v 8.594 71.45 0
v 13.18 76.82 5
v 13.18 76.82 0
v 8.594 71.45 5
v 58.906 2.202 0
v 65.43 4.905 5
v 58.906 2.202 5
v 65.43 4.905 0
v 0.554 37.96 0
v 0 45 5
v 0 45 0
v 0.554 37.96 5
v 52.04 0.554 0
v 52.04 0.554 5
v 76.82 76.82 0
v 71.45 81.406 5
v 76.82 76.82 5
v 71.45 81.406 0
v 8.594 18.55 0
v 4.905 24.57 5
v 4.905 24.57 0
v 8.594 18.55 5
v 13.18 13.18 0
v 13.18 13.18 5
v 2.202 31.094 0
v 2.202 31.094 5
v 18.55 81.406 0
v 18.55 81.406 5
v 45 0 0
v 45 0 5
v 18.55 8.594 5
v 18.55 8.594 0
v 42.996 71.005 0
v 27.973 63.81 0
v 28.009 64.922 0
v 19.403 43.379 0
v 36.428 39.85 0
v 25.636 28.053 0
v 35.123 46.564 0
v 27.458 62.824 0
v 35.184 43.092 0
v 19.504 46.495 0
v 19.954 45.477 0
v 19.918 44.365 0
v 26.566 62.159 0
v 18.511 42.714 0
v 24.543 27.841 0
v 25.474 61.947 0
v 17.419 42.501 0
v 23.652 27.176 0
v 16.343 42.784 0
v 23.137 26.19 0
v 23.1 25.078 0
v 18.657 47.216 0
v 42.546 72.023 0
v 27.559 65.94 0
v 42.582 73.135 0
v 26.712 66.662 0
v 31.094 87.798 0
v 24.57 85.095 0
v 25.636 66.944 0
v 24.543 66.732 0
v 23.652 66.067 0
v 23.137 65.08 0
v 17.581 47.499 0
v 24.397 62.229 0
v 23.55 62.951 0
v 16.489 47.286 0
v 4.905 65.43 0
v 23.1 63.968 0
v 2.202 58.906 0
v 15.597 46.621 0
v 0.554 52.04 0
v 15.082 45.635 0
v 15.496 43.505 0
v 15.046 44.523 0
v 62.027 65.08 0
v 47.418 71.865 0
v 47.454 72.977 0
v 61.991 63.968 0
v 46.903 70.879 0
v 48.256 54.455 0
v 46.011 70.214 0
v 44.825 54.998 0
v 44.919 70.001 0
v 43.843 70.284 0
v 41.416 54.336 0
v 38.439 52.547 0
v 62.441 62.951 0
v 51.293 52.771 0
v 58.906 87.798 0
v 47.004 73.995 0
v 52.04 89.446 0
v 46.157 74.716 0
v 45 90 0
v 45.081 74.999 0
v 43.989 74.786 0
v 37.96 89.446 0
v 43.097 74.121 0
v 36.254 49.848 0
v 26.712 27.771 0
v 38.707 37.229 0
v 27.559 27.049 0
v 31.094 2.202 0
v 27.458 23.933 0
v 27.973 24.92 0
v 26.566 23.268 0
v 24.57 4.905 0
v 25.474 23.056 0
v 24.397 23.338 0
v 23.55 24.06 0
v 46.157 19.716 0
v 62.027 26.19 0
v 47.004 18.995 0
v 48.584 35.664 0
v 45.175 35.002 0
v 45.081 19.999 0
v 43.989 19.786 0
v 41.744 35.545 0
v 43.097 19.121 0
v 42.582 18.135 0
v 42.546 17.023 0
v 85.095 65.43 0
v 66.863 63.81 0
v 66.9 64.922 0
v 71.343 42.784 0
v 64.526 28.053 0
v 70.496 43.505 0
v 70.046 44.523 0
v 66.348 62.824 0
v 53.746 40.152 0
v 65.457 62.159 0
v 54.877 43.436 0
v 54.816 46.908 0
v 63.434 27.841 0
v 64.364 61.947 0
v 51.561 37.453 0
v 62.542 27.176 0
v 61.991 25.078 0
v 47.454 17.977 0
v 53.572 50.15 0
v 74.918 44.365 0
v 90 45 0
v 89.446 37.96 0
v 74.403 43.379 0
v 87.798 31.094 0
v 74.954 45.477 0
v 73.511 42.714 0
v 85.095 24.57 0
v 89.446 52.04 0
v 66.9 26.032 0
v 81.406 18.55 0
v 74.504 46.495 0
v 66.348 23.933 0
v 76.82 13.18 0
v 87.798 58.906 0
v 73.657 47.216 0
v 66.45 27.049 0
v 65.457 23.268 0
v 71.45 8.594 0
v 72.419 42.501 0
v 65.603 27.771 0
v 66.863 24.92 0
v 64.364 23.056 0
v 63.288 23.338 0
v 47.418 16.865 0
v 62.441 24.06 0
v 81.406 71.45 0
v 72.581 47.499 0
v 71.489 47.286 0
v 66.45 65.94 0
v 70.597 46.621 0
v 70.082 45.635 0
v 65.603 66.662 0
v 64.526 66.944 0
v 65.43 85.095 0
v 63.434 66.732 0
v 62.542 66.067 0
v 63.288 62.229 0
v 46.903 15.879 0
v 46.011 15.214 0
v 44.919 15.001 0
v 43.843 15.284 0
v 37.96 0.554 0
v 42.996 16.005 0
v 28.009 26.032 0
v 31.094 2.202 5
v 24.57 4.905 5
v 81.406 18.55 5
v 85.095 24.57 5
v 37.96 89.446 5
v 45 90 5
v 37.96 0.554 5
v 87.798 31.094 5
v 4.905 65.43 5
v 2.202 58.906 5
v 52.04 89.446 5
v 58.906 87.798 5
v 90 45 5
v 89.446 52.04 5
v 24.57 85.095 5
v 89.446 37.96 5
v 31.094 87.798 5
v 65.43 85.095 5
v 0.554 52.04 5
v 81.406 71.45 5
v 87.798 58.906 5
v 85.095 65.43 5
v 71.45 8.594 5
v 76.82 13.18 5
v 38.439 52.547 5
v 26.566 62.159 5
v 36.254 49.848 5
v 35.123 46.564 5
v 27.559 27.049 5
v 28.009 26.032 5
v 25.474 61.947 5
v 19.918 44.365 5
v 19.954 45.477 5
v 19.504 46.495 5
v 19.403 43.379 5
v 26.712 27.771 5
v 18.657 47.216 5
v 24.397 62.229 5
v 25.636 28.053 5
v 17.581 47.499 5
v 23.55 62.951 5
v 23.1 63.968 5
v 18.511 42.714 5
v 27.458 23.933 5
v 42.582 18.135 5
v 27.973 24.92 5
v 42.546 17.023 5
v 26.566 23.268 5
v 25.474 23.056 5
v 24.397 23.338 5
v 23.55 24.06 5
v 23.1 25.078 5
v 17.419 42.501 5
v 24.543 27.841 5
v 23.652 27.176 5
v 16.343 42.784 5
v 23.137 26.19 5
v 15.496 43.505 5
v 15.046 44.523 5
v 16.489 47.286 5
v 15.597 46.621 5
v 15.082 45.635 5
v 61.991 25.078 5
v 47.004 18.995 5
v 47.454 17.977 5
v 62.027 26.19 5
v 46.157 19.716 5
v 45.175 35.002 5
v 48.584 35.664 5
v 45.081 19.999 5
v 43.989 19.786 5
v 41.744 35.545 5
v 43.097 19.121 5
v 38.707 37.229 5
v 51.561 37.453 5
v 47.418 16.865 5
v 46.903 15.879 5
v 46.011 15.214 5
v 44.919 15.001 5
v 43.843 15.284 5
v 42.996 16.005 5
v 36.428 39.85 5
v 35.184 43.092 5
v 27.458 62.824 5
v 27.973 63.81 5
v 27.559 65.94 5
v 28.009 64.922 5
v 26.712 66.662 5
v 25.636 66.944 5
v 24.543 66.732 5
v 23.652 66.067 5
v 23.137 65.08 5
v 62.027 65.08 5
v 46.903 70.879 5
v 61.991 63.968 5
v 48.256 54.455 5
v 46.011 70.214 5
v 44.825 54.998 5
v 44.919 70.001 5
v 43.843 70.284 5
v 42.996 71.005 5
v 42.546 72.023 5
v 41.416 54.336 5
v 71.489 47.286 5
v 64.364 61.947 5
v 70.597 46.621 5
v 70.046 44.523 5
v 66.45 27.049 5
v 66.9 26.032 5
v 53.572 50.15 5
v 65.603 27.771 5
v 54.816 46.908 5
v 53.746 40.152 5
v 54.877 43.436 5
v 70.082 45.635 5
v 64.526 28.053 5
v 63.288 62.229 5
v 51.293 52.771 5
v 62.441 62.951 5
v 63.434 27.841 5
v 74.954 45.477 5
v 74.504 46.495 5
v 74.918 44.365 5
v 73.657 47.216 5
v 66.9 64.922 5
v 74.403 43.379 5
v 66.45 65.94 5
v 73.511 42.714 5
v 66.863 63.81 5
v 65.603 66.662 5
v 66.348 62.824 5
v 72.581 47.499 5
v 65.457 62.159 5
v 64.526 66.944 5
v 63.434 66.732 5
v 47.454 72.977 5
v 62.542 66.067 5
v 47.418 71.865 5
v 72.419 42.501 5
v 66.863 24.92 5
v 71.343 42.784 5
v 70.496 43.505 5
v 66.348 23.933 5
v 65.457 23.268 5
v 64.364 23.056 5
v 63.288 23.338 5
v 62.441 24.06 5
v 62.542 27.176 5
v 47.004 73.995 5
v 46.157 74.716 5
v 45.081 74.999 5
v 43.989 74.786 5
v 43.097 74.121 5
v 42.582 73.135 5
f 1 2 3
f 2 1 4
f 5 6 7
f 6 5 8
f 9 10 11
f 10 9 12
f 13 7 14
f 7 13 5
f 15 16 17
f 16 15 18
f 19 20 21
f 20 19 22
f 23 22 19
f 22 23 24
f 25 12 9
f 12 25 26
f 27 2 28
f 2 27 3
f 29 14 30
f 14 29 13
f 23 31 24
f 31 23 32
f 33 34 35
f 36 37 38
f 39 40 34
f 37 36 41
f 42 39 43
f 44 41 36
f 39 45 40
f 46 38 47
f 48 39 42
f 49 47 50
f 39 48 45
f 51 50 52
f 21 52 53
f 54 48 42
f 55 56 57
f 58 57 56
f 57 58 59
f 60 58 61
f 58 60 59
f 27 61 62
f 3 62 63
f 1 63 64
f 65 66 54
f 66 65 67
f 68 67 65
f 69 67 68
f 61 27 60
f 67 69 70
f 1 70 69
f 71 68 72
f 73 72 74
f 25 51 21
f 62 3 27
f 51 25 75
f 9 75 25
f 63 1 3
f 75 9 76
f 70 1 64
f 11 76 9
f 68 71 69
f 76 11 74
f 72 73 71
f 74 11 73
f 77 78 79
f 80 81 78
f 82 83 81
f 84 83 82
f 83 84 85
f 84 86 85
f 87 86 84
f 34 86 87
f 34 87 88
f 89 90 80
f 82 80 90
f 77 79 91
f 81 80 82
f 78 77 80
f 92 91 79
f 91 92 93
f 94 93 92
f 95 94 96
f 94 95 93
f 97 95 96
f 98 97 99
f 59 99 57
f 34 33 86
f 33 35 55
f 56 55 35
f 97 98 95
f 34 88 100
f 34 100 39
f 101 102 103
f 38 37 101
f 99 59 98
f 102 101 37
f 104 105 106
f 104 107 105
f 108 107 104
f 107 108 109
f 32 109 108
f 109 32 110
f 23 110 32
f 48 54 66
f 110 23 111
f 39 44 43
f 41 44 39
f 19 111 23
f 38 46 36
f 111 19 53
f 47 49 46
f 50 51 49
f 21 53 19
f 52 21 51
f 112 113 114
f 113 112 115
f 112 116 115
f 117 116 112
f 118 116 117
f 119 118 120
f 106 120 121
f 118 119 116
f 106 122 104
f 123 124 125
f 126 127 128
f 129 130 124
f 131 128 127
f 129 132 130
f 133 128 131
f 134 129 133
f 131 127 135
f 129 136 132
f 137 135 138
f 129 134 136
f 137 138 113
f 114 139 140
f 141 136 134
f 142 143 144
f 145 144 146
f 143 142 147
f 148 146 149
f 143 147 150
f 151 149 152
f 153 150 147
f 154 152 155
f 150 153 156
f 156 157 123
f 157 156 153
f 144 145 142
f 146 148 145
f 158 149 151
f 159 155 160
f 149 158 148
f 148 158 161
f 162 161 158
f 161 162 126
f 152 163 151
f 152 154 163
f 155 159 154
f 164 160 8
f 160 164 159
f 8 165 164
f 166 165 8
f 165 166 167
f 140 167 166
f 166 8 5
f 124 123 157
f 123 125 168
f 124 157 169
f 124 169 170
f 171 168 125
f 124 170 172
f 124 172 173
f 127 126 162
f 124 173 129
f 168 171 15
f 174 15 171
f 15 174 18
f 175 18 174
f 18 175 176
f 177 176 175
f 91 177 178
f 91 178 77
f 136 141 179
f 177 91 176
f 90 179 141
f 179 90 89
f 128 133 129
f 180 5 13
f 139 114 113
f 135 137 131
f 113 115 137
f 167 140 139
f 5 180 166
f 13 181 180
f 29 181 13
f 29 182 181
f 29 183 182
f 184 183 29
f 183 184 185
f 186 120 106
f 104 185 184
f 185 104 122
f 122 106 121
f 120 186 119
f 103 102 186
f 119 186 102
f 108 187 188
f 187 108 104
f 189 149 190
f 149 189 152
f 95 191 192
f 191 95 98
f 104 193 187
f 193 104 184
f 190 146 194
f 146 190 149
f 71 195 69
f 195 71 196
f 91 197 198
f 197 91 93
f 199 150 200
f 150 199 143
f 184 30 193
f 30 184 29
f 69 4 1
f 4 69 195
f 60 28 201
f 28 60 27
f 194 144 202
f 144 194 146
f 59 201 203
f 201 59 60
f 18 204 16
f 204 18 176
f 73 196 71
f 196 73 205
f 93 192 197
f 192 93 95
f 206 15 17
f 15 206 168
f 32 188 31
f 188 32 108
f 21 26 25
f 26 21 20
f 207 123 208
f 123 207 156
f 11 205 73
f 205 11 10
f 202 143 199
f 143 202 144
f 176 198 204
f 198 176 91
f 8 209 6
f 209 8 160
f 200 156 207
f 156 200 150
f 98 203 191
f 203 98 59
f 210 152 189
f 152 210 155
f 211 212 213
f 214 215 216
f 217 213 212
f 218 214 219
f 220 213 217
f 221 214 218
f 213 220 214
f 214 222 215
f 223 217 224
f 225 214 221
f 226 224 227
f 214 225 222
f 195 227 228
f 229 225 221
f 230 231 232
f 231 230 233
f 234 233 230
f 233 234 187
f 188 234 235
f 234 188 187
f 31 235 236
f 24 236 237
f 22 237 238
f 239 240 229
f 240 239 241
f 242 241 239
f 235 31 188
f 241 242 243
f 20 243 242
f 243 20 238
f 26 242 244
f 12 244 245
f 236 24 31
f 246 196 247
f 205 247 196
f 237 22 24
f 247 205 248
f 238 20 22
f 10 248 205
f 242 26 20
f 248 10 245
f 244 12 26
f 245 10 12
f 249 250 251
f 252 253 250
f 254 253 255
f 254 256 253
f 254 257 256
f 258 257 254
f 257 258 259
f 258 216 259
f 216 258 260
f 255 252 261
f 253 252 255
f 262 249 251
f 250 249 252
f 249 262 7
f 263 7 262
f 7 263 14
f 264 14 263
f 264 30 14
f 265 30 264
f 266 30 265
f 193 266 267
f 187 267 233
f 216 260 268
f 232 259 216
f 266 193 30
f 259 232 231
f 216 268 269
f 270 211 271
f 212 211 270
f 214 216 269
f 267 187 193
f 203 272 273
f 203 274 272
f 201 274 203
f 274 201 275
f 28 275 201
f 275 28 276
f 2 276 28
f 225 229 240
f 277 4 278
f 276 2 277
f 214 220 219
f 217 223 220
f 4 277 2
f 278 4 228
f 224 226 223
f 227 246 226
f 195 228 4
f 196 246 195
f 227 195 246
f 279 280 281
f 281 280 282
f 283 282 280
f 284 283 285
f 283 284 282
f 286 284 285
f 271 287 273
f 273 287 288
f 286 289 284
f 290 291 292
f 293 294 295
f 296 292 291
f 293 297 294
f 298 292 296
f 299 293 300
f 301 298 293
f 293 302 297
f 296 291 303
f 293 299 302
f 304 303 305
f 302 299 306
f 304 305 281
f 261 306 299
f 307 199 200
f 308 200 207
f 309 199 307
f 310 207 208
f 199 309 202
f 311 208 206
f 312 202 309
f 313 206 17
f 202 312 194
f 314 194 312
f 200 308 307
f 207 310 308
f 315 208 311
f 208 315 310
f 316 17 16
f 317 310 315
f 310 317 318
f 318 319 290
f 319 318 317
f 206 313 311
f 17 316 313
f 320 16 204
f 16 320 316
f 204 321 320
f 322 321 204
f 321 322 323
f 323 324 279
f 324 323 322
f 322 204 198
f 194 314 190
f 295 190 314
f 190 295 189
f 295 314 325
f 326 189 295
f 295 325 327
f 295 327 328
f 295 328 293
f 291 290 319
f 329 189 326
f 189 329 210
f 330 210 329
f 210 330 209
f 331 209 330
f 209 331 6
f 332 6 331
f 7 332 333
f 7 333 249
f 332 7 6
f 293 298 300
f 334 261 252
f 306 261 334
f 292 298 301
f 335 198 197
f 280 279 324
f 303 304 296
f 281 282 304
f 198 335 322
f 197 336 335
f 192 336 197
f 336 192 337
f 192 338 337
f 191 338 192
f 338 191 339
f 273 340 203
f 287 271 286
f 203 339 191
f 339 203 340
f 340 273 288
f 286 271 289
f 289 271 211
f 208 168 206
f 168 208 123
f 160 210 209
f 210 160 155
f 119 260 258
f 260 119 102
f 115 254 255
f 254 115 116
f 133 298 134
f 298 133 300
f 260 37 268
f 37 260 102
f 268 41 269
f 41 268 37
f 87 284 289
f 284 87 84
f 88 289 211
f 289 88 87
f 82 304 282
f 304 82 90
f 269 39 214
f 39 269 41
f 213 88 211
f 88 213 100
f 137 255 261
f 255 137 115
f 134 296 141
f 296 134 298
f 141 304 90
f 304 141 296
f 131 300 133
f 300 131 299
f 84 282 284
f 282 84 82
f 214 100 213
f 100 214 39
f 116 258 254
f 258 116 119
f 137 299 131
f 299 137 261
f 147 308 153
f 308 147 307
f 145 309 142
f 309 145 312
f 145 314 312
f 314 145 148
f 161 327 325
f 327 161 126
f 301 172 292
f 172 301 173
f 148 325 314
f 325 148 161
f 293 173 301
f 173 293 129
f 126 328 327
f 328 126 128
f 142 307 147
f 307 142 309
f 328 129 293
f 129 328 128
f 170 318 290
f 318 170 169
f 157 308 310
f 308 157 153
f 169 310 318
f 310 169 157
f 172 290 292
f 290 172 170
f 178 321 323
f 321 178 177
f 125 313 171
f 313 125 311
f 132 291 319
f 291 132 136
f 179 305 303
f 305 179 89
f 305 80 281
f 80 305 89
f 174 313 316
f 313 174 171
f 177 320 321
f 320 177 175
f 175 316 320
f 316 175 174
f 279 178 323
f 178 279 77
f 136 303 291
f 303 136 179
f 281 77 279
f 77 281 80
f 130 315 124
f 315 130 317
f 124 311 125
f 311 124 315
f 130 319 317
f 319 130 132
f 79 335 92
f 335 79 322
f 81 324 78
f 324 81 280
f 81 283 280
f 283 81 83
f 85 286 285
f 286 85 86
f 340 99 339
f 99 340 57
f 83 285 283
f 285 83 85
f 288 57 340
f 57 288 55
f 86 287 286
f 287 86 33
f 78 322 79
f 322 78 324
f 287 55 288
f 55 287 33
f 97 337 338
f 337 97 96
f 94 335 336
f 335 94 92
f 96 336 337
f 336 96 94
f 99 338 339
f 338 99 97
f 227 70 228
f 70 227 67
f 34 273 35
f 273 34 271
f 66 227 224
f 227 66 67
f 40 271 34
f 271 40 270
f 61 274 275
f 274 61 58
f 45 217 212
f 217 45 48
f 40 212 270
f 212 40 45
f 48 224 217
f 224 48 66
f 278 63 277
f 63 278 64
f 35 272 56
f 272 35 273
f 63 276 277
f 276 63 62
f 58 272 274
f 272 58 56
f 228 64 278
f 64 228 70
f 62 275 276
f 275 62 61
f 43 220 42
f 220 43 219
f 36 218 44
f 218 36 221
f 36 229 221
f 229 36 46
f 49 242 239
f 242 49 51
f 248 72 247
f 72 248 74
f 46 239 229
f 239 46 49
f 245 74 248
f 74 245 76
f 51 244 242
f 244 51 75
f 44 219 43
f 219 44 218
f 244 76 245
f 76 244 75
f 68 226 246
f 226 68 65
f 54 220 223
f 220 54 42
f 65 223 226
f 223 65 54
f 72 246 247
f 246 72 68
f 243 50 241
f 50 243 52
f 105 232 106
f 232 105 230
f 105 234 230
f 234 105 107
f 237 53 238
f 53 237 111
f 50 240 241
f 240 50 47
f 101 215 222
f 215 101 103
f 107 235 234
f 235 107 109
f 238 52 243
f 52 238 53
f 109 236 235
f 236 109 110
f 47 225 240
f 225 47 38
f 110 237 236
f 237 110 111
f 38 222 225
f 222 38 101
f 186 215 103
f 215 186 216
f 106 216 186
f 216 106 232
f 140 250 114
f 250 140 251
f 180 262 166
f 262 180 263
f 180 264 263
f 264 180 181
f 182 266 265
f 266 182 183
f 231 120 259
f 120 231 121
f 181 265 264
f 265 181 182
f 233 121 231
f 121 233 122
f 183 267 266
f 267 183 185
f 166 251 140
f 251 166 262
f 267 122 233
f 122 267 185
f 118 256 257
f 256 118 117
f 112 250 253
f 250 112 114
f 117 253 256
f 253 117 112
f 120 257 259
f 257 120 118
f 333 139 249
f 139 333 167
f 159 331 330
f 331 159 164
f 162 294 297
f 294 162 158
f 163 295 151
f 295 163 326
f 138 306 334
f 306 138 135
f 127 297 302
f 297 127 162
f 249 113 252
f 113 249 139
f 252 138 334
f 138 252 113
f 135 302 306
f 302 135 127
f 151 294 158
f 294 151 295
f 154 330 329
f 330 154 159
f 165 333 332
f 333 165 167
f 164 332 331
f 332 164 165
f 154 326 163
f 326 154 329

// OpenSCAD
$fn = 32;

// ----------------------------------------------------------------------
// Spacer plate: round flange R45, 8 bolts
// ----------------------------------------------------------------------

// --- parameters (mm) ---
bore_r = 10;              // centre bore radius
bolt_r = 2.5;             // bolt hole radius
plate_t = 5;              // plate thickness, Z (extrusion height)
flange_r = 45;            // flange radius
n_bolt = 8;               // bolt hole count
ring_r = 27.5;            // bolt circle radius
fit_tol = 0.02;           // declared fit tolerance (prompt contract)
free_tol = 0.2;           // declared free tolerance (prompt contract)

profile = [[90, 45], [89.446, 52.04], [87.798, 58.906], [85.095, 65.43], [81.406, 71.45], [76.82, 76.82], [71.45, 81.406], [65.43, 85.095], [58.906, 87.798], [52.04, 89.446], [45, 90], [37.96, 89.446], [31.094, 87.798], [24.57, 85.095], [18.55, 81.406], [13.18, 76.82], [8.594, 71.45], [4.905, 65.43], [2.202, 58.906], [0.554, 52.04], [0, 45], [0.554, 37.96], [2.202, 31.094], [4.905, 24.57], [8.594, 18.55], [13.18, 13.18], [18.55, 8.594], [24.57, 4.905], [31.094, 2.202], [37.96, 0.554], [45, 0], [52.04, 0.554], [58.906, 2.202], [65.43, 4.905], [71.45, 8.594], [76.82, 13.18], [81.406, 18.55], [85.095, 24.57], [87.798, 31.094], [89.446, 37.96]];  // primary outline, 40 points, counter clockwise
void_1 = [[54.816, 46.908], [53.572, 50.15], [51.293, 52.771], [48.256, 54.455], [44.825, 54.998], [41.416, 54.336], [38.439, 52.547], [36.254, 49.848], [35.123, 46.564], [35.184, 43.092], [36.428, 39.85], [38.707, 37.229], [41.744, 35.545], [45.175, 35.002], [48.584, 35.664], [51.561, 37.453], [53.746, 40.152], [54.877, 43.436]];  // centre bore, 18 points
void_2 = [[74.954, 45.477], [74.504, 46.495], [73.657, 47.216], [72.581, 47.499], [71.489, 47.286], [70.597, 46.621], [70.082, 45.635], [70.046, 44.523], [70.496, 43.505], [71.343, 42.784], [72.419, 42.501], [73.511, 42.714], [74.403, 43.379], [74.918, 44.365]];  // bolt hole 1, 14 points
void_3 = [[66.9, 64.922], [66.45, 65.94], [65.603, 66.662], [64.526, 66.944], [63.434, 66.732], [62.542, 66.067], [62.027, 65.08], [61.991, 63.968], [62.441, 62.951], [63.288, 62.229], [64.364, 61.947], [65.457, 62.159], [66.348, 62.824], [66.863, 63.81]];  // bolt hole 2, 14 points
void_4 = [[47.454, 72.977], [47.004, 73.995], [46.157, 74.716], [45.081, 74.999], [43.989, 74.786], [43.097, 74.121], [42.582, 73.135], [42.546, 72.023], [42.996, 71.005], [43.843, 70.284], [44.919, 70.001], [46.011, 70.214], [46.903, 70.879], [47.418, 71.865]];  // bolt hole 3, 14 points
void_5 = [[28.009, 64.922], [27.559, 65.94], [26.712, 66.662], [25.636, 66.944], [24.543, 66.732], [23.652, 66.067], [23.137, 65.08], [23.1, 63.968], [23.55, 62.951], [24.397, 62.229], [25.474, 61.947], [26.566, 62.159], [27.458, 62.824], [27.973, 63.81]];  // bolt hole 4, 14 points
void_6 = [[19.954, 45.477], [19.504, 46.495], [18.657, 47.216], [17.581, 47.499], [16.489, 47.286], [15.597, 46.621], [15.082, 45.635], [15.046, 44.523], [15.496, 43.505], [16.343, 42.784], [17.419, 42.501], [18.511, 42.714], [19.403, 43.379], [19.918, 44.365]];  // bolt hole 5, 14 points
void_7 = [[28.009, 26.032], [27.559, 27.049], [26.712, 27.771], [25.636, 28.053], [24.543, 27.841], [23.652, 27.176], [23.137, 26.19], [23.1, 25.078], [23.55, 24.06], [24.397, 23.338], [25.474, 23.056], [26.566, 23.268], [27.458, 23.933], [27.973, 24.92]];  // bolt hole 6, 14 points
void_8 = [[47.454, 17.977], [47.004, 18.995], [46.157, 19.716], [45.081, 19.999], [43.989, 19.786], [43.097, 19.121], [42.582, 18.135], [42.546, 17.023], [42.996, 16.005], [43.843, 15.284], [44.919, 15.001], [46.011, 15.214], [46.903, 15.879], [47.418, 16.865]];  // bolt hole 7, 14 points
void_9 = [[66.9, 26.032], [66.45, 27.049], [65.603, 27.771], [64.526, 28.053], [63.434, 27.841], [62.542, 27.176], [62.027, 26.19], [61.991, 25.078], [62.441, 24.06], [63.288, 23.338], [64.364, 23.056], [65.457, 23.268], [66.348, 23.933], [66.863, 24.92]];  // bolt hole 8, 14 points

// --- the one profile operation ---
difference() {
  linear_extrude(height = plate_t) polygon(points = profile);
  translate([0, 0, -1])
    linear_extrude(height = plate_t + 2) polygon(points = void_1);
  translate([0, 0, -1])
    linear_extrude(height = plate_t + 2) polygon(points = void_2);
  translate([0, 0, -1])
    linear_extrude(height = plate_t + 2) polygon(points = void_3);
  translate([0, 0, -1])
    linear_extrude(height = plate_t + 2) polygon(points = void_4);
  translate([0, 0, -1])
    linear_extrude(height = plate_t + 2) polygon(points = void_5);
  translate([0, 0, -1])
    linear_extrude(height = plate_t + 2) polygon(points = void_6);
  translate([0, 0, -1])
    linear_extrude(height = plate_t + 2) polygon(points = void_7);
  translate([0, 0, -1])
    linear_extrude(height = plate_t + 2) polygon(points = void_8);
  translate([0, 0, -1])
    linear_extrude(height = plate_t + 2) polygon(points = void_9);
}
